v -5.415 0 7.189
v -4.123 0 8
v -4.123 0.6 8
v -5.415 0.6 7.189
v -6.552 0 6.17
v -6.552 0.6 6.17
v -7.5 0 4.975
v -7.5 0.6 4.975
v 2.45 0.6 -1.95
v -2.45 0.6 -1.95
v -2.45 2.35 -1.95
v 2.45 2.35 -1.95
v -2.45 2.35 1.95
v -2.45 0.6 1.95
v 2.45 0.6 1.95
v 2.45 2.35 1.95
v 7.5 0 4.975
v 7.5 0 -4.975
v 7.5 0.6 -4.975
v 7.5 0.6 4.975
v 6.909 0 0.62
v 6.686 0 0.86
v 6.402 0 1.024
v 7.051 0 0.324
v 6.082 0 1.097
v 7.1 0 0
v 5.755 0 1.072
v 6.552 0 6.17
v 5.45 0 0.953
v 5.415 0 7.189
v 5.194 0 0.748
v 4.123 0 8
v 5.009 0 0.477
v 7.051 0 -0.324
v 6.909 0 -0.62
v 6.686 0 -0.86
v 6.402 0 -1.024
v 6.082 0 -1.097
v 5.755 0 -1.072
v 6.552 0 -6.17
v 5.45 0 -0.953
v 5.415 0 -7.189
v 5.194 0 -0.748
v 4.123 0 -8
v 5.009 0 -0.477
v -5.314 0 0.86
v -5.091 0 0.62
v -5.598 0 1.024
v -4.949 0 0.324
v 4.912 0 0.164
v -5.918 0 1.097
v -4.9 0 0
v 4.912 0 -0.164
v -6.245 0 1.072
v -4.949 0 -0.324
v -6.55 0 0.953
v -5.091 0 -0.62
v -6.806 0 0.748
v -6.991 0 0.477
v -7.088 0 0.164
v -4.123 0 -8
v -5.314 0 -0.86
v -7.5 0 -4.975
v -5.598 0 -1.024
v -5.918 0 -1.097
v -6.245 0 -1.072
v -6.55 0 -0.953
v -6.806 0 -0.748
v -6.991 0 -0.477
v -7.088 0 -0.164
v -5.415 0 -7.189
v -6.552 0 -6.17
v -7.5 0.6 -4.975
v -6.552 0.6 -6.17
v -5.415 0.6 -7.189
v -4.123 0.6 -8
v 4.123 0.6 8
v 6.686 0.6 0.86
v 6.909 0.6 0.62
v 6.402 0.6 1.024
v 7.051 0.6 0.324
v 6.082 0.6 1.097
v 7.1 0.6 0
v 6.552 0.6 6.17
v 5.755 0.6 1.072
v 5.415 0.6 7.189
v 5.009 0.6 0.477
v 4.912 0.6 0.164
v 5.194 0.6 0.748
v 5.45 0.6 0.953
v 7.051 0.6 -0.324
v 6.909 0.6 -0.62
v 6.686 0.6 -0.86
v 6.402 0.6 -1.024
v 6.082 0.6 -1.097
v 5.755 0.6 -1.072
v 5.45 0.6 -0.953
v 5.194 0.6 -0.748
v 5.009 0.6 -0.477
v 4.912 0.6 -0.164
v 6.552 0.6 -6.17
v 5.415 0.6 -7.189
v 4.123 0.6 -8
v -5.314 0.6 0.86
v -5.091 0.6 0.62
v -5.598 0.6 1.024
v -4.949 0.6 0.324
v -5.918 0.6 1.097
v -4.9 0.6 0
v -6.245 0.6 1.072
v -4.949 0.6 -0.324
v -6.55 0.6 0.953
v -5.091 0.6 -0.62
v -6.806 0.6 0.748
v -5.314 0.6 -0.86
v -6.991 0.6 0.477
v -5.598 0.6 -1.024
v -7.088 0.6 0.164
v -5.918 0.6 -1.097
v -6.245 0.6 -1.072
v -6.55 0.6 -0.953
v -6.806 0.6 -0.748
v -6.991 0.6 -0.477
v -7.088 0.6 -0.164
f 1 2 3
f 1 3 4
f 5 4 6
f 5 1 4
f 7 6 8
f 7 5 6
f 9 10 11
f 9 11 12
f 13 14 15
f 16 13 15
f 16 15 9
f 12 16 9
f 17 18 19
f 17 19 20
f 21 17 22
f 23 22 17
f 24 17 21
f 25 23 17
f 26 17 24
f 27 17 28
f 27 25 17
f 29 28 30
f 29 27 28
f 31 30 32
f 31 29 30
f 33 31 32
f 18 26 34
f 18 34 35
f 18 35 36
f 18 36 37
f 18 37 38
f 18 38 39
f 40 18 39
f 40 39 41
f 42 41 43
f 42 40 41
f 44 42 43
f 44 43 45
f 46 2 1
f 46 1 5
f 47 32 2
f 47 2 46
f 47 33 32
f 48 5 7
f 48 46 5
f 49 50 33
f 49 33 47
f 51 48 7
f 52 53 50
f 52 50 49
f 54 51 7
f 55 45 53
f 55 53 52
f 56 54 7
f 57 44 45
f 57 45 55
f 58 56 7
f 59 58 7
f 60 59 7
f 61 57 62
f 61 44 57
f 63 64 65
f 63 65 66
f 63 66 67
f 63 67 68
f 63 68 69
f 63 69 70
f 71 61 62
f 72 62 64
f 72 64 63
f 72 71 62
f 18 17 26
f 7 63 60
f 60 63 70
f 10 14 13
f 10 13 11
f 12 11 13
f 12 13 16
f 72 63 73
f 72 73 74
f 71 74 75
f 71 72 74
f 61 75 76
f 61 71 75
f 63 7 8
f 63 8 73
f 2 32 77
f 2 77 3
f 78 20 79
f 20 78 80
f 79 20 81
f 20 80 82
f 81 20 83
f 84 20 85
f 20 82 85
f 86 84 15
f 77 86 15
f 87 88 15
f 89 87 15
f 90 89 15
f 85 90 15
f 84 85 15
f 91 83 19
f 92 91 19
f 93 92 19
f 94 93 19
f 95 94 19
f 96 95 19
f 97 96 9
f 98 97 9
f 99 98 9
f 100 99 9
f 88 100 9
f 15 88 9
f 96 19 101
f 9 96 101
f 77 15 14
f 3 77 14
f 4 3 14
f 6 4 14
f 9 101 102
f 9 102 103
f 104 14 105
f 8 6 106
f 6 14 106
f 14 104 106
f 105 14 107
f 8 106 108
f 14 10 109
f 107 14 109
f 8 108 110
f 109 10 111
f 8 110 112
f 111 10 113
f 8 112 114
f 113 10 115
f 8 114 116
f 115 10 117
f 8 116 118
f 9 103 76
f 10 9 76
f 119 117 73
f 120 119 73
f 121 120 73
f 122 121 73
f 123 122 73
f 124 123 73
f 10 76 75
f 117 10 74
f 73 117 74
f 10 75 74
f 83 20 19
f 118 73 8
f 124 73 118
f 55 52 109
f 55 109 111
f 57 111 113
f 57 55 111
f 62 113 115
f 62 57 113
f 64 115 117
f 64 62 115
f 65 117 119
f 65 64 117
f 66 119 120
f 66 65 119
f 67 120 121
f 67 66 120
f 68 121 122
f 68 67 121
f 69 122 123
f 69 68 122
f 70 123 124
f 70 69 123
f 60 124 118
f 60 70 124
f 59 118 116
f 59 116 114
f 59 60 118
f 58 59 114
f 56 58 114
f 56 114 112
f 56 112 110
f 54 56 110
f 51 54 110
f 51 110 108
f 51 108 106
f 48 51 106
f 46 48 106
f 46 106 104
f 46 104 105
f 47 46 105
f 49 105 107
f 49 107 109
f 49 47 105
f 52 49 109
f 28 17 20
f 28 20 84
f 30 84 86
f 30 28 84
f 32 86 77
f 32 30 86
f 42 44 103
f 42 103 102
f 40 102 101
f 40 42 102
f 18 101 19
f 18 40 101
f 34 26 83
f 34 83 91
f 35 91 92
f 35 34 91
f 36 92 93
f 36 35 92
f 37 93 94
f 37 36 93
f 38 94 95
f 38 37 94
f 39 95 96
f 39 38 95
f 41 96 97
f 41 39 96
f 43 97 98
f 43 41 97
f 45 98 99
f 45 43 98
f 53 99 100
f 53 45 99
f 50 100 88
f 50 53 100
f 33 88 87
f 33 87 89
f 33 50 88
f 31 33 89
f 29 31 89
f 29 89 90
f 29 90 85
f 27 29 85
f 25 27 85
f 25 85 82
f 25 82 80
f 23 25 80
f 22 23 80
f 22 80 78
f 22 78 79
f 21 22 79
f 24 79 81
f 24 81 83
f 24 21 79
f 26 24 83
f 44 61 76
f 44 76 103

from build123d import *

# Parameters (mm, degrees)
SKETCH_1_R      = 1.1
EXTRUDE_1_DEPTH = 0.6
SKETCH_2_W      = 4.9
SKETCH_2_H      = 3.9
EXTRUDE_2_DEPTH = 1.75


with BuildPart() as part:
    # 草图1 → 凸台-拉伸1 (new body)
    with BuildSketch(Plane(origin=(0, 0, 0), x_dir=(1, 0, 0), z_dir=(0, 1, 0))):
        with BuildLine():
            Line((-4.123105626, 8), (4.123105626, 8))
            ThreePointArc((4.123105626, 8), (6.005155898, 6.703588789), (7.5, 4.974937186))
            Line((7.5, 4.974937186), (7.5, -4.974937186))
            ThreePointArc((7.5, -4.974937186), (6.005155898, -6.703588789), (4.123105626, -8))
            Line((4.123105626, -8), (-4.123105626, -8))
            ThreePointArc((-4.123105626, -8), (-6.005155898, -6.703588789), (-7.5, -4.974937186))
            Line((-7.5, -4.974937186), (-7.5, 4.974937186))
            ThreePointArc((-7.5, 4.974937186), (-6.005155898, 6.703588789), (-4.123105626, 8))
        make_face()
        with Locations((-6, 0)):
            Circle(SKETCH_1_R, mode=Mode.SUBTRACT)
        with Locations((6, 0)):
            Circle(SKETCH_1_R, mode=Mode.SUBTRACT)
    extrude(amount=EXTRUDE_1_DEPTH)

    # 草图2 → 凸台-拉伸2 (add)
    with BuildSketch(Plane(origin=(0, 0.6, 0), x_dir=(1, 0, 0), z_dir=(0, 1, 0))):
        Rectangle(SKETCH_2_W, SKETCH_2_H)
    extrude(amount=EXTRUDE_2_DEPTH)


solid = part.part
